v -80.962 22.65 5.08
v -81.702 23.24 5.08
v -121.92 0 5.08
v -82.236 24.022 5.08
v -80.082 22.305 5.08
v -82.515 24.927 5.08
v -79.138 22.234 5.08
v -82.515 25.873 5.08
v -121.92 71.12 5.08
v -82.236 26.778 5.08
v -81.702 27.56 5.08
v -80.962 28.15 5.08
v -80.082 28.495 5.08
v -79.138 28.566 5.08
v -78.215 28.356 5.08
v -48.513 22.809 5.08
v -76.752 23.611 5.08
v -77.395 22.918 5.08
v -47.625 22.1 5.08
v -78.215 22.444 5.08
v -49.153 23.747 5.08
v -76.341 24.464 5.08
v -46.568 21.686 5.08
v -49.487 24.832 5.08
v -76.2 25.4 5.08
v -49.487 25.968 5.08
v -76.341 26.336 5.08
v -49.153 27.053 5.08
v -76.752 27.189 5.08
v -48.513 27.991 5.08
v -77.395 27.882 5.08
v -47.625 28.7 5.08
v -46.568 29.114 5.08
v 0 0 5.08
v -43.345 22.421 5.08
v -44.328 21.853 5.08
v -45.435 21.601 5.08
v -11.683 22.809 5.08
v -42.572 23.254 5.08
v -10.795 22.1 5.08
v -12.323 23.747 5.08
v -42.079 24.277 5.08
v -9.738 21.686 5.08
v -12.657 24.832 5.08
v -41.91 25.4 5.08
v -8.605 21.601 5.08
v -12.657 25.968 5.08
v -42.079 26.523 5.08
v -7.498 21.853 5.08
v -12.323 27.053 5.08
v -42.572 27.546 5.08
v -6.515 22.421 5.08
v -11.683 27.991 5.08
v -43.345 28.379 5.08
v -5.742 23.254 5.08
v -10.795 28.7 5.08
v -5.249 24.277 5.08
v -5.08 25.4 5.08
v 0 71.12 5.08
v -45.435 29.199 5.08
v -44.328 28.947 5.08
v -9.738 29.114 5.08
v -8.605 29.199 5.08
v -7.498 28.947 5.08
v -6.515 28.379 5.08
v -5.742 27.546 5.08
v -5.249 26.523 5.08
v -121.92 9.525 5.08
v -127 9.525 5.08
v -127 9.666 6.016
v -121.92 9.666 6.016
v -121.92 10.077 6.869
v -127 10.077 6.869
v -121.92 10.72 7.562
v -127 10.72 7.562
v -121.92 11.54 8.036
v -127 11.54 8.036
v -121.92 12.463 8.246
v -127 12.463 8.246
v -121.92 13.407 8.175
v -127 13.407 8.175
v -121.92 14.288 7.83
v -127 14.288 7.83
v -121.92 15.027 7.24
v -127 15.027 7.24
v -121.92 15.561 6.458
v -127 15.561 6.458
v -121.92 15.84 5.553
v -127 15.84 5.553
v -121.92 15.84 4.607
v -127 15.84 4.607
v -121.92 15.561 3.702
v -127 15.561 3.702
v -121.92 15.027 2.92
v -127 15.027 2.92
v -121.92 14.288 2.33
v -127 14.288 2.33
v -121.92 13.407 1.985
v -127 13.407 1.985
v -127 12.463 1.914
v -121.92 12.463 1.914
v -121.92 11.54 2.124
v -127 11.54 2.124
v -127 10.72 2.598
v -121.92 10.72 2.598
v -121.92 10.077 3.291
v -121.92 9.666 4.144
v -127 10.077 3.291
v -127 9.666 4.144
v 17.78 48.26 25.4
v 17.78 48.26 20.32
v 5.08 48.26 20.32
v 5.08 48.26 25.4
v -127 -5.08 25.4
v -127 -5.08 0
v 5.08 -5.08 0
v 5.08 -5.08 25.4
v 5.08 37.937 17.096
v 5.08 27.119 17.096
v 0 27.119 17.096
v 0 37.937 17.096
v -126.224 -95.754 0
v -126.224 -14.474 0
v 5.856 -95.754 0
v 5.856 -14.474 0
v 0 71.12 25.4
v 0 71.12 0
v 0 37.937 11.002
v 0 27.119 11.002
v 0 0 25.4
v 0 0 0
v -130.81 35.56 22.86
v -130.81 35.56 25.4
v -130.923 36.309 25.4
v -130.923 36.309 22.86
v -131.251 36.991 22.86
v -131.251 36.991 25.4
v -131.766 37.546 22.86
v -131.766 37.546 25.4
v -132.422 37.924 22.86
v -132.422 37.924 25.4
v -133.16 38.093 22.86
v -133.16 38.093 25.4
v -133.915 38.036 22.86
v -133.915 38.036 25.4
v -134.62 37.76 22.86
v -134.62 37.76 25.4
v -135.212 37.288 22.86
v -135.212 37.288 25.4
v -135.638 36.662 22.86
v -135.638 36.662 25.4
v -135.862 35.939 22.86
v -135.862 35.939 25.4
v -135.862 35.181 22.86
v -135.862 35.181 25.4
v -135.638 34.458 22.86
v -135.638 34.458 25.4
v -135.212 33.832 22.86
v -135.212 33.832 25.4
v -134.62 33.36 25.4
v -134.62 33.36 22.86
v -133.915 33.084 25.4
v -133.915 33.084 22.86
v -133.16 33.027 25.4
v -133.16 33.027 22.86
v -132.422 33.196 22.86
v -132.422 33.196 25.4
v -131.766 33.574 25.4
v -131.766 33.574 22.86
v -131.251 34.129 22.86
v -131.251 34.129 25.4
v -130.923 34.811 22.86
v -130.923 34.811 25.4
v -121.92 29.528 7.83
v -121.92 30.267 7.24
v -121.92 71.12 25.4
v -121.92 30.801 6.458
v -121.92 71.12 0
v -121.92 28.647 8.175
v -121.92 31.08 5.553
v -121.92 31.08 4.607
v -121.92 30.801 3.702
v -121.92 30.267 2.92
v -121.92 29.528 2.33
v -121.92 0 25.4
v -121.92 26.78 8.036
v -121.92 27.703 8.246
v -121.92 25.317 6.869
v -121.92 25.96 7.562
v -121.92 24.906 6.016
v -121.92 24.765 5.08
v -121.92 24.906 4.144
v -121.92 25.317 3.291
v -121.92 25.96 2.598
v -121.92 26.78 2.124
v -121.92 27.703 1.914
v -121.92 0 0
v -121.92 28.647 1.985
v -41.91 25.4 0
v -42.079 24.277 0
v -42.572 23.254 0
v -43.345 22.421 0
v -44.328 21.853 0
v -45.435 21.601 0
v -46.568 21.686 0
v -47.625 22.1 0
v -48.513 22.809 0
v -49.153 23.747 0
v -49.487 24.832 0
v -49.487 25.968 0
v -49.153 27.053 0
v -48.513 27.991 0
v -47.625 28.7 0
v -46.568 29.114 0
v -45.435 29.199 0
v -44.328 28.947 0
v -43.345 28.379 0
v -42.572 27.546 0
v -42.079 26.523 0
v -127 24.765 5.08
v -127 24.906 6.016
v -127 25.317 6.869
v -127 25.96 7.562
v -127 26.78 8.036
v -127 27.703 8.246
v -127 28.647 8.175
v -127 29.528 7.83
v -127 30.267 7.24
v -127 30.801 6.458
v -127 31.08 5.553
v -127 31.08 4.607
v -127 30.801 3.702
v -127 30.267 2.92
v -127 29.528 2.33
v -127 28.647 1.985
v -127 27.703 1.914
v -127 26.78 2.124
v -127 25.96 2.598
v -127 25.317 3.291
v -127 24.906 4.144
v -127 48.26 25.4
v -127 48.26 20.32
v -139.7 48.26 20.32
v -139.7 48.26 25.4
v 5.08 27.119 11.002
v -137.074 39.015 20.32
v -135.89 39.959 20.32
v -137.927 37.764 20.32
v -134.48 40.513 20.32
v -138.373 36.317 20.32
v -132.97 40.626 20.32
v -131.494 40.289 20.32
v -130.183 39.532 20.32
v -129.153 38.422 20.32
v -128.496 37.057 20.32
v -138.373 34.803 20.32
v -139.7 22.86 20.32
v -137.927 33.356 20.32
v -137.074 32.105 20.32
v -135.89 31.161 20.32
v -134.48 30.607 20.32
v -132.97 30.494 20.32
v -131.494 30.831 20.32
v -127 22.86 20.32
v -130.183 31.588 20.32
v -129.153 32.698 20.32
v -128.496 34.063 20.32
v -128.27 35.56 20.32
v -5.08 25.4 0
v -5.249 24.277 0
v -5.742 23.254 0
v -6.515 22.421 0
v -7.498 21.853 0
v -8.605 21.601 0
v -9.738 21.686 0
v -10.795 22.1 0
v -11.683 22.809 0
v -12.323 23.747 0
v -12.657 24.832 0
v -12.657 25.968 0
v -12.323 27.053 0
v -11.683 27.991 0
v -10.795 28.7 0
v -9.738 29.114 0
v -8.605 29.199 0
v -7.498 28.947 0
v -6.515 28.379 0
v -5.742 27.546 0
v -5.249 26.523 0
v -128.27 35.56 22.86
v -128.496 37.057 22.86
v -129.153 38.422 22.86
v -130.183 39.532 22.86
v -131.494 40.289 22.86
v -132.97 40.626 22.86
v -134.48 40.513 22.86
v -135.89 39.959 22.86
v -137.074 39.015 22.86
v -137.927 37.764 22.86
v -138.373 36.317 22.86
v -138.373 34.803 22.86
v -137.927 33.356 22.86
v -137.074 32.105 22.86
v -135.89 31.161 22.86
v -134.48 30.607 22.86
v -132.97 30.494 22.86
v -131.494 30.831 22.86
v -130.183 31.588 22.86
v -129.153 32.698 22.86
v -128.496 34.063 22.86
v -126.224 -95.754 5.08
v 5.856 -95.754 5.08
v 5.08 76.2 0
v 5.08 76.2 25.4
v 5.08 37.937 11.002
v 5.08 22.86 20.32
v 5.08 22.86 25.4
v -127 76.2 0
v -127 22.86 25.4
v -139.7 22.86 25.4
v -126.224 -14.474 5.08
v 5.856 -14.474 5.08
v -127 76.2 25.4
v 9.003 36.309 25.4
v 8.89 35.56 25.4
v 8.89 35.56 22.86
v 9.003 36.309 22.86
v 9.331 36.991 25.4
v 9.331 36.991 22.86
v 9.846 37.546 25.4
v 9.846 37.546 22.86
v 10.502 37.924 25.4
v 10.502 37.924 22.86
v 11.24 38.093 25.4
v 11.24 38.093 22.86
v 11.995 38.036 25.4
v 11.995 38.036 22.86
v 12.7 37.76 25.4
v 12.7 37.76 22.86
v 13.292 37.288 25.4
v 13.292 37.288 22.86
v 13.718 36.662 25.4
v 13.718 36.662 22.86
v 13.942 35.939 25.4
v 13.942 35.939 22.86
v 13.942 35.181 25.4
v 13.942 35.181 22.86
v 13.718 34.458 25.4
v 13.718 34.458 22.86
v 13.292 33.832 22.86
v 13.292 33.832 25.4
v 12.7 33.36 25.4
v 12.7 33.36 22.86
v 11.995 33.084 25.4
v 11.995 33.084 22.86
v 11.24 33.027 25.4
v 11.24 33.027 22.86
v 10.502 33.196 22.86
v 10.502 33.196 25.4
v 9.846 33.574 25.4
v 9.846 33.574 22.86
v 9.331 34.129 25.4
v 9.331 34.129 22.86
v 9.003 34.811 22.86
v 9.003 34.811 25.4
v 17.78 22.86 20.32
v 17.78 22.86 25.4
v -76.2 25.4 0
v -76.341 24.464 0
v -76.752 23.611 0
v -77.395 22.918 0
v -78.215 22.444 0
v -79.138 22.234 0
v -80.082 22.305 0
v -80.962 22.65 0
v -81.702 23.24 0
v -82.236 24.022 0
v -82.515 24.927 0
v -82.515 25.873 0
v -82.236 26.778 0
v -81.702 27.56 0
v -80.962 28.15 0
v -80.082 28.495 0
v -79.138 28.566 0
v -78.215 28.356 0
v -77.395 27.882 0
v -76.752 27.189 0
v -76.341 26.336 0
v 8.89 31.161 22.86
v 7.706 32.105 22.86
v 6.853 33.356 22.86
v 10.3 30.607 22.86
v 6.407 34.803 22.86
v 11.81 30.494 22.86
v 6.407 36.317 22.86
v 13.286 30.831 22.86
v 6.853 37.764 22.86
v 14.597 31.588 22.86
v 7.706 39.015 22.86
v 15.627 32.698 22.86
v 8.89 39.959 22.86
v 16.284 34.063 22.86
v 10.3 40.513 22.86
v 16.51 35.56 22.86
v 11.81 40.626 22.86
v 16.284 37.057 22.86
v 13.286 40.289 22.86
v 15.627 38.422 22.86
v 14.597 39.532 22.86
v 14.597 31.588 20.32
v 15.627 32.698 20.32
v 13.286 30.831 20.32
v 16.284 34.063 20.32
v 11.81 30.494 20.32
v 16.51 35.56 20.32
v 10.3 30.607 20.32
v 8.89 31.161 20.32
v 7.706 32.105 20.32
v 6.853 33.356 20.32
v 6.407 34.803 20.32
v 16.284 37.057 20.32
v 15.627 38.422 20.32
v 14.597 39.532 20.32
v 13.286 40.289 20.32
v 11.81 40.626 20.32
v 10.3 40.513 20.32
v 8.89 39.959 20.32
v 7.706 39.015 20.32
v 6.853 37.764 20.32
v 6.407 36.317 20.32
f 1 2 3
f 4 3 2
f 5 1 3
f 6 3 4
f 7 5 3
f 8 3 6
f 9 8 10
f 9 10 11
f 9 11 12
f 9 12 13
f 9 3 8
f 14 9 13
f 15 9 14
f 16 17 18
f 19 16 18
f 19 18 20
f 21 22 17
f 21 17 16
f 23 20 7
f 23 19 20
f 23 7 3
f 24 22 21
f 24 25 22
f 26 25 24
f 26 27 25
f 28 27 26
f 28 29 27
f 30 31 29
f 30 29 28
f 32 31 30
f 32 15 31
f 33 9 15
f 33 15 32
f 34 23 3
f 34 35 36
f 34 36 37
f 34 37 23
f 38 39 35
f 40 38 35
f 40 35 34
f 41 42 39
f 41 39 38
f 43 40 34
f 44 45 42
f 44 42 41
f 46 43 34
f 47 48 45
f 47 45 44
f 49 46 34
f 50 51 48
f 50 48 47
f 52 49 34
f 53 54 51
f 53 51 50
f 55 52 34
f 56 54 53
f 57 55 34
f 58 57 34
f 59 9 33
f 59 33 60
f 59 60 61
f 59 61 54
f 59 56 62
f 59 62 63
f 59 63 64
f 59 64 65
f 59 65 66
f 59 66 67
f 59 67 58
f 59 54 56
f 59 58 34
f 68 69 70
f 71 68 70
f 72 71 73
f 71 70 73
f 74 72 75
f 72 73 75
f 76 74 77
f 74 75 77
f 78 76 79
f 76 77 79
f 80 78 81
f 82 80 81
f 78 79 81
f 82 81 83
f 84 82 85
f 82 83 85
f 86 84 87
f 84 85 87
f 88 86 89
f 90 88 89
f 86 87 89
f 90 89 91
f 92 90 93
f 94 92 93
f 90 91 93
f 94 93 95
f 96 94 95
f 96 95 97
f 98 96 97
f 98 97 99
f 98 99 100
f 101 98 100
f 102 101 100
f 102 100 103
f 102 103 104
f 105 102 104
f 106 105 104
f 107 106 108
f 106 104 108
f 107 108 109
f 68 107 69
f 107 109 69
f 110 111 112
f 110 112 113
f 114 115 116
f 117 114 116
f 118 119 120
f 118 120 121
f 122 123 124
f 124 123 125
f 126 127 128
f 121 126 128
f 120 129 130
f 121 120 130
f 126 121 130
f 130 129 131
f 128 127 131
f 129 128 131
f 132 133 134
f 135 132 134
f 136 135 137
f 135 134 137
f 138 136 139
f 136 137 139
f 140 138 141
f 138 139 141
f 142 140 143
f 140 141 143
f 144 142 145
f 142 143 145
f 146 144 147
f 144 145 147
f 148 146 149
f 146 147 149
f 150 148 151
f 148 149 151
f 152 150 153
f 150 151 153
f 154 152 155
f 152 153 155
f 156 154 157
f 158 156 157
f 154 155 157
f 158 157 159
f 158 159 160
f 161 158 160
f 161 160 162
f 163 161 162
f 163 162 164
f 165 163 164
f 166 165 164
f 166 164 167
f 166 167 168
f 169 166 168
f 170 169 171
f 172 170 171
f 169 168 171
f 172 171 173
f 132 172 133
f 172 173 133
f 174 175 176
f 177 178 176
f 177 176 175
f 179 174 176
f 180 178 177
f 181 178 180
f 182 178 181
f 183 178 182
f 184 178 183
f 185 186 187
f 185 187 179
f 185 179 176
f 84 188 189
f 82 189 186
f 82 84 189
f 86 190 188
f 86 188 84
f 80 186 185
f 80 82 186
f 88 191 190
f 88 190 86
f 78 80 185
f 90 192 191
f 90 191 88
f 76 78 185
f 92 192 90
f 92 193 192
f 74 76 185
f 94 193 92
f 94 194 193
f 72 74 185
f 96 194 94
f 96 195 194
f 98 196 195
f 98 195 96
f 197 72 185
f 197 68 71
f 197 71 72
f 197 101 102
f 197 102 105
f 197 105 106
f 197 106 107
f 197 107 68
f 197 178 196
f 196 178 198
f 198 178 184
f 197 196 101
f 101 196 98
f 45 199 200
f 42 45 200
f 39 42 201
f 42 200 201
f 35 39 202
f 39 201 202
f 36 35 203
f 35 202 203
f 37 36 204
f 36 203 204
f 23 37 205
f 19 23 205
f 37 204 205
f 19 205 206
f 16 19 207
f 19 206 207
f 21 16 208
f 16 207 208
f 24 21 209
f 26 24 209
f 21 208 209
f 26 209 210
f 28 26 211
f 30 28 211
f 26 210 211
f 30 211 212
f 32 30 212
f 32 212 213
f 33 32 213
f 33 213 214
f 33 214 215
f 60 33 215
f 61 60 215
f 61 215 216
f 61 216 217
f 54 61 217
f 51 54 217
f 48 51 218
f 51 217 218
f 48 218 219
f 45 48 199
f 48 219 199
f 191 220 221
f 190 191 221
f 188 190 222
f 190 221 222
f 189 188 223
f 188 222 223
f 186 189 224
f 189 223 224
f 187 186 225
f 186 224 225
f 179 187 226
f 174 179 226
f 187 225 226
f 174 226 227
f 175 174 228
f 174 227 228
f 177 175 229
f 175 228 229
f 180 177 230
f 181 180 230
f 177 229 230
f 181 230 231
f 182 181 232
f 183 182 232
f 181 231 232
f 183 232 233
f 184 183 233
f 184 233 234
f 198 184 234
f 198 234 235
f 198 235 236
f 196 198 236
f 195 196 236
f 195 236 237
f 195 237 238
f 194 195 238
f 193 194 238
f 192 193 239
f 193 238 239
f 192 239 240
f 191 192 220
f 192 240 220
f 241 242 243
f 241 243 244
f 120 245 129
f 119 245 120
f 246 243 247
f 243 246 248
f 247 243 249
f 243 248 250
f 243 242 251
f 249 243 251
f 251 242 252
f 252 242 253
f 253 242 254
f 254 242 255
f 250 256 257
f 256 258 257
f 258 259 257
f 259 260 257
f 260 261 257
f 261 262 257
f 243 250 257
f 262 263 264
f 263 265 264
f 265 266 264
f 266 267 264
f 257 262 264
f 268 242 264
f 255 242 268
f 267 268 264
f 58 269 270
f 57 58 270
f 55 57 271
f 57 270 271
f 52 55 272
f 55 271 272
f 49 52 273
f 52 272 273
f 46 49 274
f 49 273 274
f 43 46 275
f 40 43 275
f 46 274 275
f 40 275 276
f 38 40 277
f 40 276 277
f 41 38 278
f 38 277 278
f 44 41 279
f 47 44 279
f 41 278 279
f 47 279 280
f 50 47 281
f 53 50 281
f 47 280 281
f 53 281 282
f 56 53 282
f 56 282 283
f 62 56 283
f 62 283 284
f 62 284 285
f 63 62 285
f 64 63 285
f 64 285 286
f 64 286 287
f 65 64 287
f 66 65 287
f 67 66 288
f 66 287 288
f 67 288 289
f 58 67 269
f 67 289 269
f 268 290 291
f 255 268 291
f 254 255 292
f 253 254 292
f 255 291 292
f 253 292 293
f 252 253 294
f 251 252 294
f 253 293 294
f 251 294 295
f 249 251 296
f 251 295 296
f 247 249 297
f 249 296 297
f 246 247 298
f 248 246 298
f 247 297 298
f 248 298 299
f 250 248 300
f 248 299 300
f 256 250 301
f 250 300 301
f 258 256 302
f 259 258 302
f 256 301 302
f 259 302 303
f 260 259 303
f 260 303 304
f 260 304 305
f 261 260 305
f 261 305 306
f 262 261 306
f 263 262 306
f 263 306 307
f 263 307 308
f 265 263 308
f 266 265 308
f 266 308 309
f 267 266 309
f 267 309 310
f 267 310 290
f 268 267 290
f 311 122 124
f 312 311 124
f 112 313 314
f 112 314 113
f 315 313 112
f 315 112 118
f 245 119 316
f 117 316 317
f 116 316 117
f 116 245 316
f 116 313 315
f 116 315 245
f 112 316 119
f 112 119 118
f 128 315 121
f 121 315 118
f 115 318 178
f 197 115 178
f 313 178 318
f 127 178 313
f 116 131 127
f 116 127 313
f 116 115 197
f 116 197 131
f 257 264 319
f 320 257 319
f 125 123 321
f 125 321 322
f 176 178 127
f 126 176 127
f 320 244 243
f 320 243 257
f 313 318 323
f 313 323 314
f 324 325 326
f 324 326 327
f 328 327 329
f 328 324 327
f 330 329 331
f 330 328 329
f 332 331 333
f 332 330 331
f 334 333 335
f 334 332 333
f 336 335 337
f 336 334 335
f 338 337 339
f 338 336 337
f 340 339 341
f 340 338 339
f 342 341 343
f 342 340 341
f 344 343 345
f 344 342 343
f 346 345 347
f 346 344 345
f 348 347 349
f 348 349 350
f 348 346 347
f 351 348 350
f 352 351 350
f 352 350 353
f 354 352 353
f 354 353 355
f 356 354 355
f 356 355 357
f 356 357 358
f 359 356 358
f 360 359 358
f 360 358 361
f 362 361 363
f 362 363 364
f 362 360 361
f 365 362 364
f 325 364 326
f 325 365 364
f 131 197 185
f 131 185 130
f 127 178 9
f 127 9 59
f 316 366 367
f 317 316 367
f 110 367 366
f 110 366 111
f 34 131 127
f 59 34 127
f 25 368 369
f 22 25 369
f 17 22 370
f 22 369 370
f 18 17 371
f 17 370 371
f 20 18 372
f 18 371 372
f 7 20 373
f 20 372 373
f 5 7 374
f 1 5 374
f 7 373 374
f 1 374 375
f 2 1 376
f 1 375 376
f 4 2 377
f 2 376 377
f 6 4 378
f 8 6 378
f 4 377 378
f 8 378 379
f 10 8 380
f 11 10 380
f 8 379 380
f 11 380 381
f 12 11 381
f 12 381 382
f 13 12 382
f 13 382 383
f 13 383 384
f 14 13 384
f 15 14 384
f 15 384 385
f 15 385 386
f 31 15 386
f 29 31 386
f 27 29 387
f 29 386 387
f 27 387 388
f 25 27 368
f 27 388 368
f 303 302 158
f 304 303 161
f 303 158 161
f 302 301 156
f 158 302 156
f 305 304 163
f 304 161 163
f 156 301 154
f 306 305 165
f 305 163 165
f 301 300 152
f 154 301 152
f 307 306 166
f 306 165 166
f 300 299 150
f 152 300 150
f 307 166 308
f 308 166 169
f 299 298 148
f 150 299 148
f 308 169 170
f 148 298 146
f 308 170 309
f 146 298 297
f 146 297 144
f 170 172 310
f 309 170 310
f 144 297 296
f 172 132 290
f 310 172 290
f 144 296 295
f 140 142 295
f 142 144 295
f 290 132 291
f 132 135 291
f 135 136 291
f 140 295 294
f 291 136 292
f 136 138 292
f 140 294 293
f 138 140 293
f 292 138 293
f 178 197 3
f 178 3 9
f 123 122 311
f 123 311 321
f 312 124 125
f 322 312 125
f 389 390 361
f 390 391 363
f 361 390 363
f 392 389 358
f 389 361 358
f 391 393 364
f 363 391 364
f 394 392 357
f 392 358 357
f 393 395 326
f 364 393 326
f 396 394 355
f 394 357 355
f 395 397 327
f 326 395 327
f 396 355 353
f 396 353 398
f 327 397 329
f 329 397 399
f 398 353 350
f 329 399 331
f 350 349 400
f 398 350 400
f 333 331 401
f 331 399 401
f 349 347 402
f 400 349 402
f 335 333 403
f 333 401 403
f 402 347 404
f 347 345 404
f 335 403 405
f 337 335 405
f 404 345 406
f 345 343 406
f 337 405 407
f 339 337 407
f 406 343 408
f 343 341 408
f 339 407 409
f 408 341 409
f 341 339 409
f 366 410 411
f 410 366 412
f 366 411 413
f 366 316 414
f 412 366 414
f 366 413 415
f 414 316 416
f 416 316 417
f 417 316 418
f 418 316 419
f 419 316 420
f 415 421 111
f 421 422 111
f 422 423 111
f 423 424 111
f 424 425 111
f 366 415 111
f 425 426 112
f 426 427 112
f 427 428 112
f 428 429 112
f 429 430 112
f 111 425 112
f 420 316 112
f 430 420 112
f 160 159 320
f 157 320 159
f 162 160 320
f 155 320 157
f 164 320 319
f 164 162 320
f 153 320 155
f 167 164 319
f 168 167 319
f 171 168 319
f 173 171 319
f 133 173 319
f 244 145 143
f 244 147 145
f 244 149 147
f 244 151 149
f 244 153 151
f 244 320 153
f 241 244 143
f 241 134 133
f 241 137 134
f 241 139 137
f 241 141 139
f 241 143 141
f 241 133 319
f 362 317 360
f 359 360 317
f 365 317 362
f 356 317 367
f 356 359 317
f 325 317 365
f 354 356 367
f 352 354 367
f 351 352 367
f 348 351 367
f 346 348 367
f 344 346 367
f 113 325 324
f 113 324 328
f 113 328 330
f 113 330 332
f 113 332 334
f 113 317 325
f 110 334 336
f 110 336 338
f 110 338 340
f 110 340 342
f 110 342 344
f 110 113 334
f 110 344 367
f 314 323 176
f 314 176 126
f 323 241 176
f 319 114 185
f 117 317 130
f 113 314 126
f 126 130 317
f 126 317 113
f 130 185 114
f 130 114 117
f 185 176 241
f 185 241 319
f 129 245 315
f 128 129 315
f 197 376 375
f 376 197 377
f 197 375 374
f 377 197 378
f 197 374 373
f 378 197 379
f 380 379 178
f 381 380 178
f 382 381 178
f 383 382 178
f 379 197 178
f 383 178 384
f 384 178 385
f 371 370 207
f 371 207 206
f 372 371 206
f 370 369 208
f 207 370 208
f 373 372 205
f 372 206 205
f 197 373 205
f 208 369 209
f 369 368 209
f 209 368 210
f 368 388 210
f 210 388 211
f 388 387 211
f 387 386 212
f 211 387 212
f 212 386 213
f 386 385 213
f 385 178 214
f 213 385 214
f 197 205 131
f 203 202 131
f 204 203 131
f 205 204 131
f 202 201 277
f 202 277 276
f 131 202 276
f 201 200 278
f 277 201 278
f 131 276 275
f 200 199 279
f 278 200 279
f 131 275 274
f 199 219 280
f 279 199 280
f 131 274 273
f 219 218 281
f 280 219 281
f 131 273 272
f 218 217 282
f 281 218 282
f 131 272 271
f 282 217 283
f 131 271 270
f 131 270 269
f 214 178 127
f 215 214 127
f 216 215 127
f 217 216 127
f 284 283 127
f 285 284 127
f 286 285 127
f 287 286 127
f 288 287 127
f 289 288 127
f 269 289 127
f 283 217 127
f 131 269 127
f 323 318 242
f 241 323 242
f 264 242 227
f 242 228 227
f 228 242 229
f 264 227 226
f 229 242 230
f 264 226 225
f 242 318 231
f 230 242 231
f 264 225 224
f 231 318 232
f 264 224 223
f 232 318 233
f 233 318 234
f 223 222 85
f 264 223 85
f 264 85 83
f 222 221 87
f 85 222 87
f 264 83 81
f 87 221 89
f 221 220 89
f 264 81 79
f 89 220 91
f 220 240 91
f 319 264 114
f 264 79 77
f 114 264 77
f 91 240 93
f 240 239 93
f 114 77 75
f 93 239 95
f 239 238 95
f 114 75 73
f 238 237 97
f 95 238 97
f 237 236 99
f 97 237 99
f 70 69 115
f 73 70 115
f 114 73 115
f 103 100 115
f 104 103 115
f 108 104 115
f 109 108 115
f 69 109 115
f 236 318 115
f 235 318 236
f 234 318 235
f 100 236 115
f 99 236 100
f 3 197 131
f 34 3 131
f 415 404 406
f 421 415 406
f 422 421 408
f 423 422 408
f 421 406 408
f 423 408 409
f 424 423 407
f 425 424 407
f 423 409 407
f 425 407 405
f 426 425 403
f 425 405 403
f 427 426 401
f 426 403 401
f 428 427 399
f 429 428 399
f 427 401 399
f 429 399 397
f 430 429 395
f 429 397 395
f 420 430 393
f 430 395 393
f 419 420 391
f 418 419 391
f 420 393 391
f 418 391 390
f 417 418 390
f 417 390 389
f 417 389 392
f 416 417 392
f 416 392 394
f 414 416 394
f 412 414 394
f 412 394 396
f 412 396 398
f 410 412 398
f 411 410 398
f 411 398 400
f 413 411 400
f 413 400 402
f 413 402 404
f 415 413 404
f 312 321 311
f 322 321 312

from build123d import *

# Parameters (mm, degrees)
F0_W      = 121.92
F0_H      = 71.12
F1_DEPTH  = 5.08
F2_W      = 132.08
F2_H      = 81.28
F2_W_2    = 121.92
F2_H_2    = 71.12
F3_DEPTH  = 25.4
F4_R      = 3.81
F5_DEPTH  = 5.08
F6_R      = 3.81
F7_DEPTH  = 5.08
F8_R      = 3.175
F9_DEPTH  = 5.08
F11_R     = 3.175
F12_DEPTH = 5.08
F13_DEPTH = 5.08
F14_W     = 10.817503
F14_H     = 6.094383
F15_DEPTH = 5.08
F16_W     = 25.4
F16_H     = 5.08
F17_DEPTH = 12.7
F18_W     = 25.4
F18_H     = 5.08
F19_DEPTH = 12.7
F20_R     = 5.08
F21_DEPTH = 5.08
F22_R     = 5.08
F23_DEPTH = 5.08
F24_W     = 132.08
F24_H     = 81.28
F25_DEPTH = 5.08
F26_R     = 5.08
F26_R_2   = 2.54
F27_DEPTH = 2.54


with BuildPart() as f1:
    # F0 (on Top) → F1 (new body)
    with BuildSketch(Plane.XY):
        with Locations((-60.96, 35.56)):
            Rectangle(F0_W, F0_H)
    extrude(amount=F1_DEPTH)

    # F4 (on face) → F5 (cut)
    with BuildSketch(Plane(origin=(0, 0, 0), x_dir=(1, 0, 0), z_dir=(0, 0, -1))):
        with Locations((-45.72, -25.4)):
            Circle(F4_R)
    extrude(amount=-F5_DEPTH, mode=Mode.SUBTRACT)

    # F6 (on face) → F7 (cut)
    with BuildSketch(Plane(origin=(0, 0, 0), x_dir=(1, 0, 0), z_dir=(0, 0, -1))):
        with Locations((-8.89, -25.4)):
            Circle(F6_R)
    extrude(amount=-F7_DEPTH, mode=Mode.SUBTRACT)

    # F8 (on face) → F9 (cut)
    with BuildSketch(Plane(origin=(0, 0, 0), x_dir=(1, 0, 0), z_dir=(0, 0, -1))):
        with Locations((-79.375, -25.4)):
            Circle(F8_R)
    extrude(amount=-F9_DEPTH, mode=Mode.SUBTRACT)


with BuildPart() as f3:
    # F2 (on face) → F3 (new body)
    with BuildSketch(Plane(origin=(0, 0, 0), x_dir=(1, 0, 0), z_dir=(0, 0, -1))):
        with Locations((-60.96, -35.56)):
            Rectangle(F2_W, F2_H)
        with Locations((-60.96, -35.56)):
            Rectangle(F2_W_2, F2_H_2, mode=Mode.SUBTRACT)
    extrude(amount=-F3_DEPTH)

    # F11 (on face) → F12 (cut)
    with BuildSketch(Plane(origin=(-127, 0, 0), x_dir=(0, -1, 0), z_dir=(-1, 0, 0))):
        with Locations((-27.94, 5.08)):
            Circle(F11_R)
    extrude(amount=-F12_DEPTH, mode=Mode.SUBTRACT)

    # F11 (on face) → F13 (cut)
    with BuildSketch(Plane(origin=(-127, 0, 0), x_dir=(0, -1, 0), z_dir=(-1, 0, 0))):
        with Locations((-12.7, 5.08)):
            Circle(F11_R)
    extrude(amount=-F13_DEPTH, mode=Mode.SUBTRACT)

    # F14 (on face) → F15 (cut)
    with BuildSketch(Plane.YZ.offset(5.08)):
        with Locations((32.528084, 14.049074)):
            Rectangle(F14_W, F14_H)
    extrude(amount=-F15_DEPTH, mode=Mode.SUBTRACT)

    # F16 (on face) → F17 (join)
    with BuildSketch(Plane.YZ.offset(5.08)):
        with Locations((35.56, 22.86)):
            Rectangle(F16_W, F16_H)
    extrude(amount=F17_DEPTH)

    # F18 (on face) → F19 (join)
    with BuildSketch(Plane(origin=(-127, 0, 0), x_dir=(0, -1, 0), z_dir=(-1, 0, 0))):
        with Locations((-35.56, 22.86)):
            Rectangle(F18_W, F18_H)
    extrude(amount=F19_DEPTH)

    # F20 (on face) → F21 (cut)
    with BuildSketch(Plane.XY.offset(25.4)):
        with Locations((11.43, 35.56)):
            Circle(F20_R)
    extrude(amount=-F21_DEPTH, mode=Mode.SUBTRACT)

    # F22 (on face) → F23 (cut)
    with BuildSketch(Plane.XY.offset(25.4)):
        with Locations((-133.35, 35.56)):
            Circle(F22_R)
    extrude(amount=-F23_DEPTH, mode=Mode.SUBTRACT)

    # F26 (on face) → F27 (join)
    with BuildSketch(Plane.XY.offset(25.4)):
        with BuildLine():
            ThreePointArc((6.35, 35.56), (11.43, 30.48), (16.51, 35.56))
            ThreePointArc((16.51, 35.56), (11.43, 40.64), (6.35, 35.56))
        make_face()
        with BuildLine():
            ThreePointArc((13.97, 35.56), (11.43, 33.02), (8.89, 35.56))
            ThreePointArc((8.89, 35.56), (11.43, 38.1), (13.97, 35.56))
        make_face(mode=Mode.SUBTRACT)
        with Locations((-133.35, 35.56)):
            Circle(F26_R)
        with Locations((-133.35, 35.56)):
            Circle(F26_R_2, mode=Mode.SUBTRACT)
    extrude(amount=-F27_DEPTH)


with BuildPart() as f25:
    # F24 (on Top) → F25 (new body)
    with BuildSketch(Plane.XY):
        with Locations((-60.183757, -55.114367)):
            Rectangle(F24_W, F24_H)
    extrude(amount=F25_DEPTH)


solid = Compound([f1.part, f3.part, f25.part])
